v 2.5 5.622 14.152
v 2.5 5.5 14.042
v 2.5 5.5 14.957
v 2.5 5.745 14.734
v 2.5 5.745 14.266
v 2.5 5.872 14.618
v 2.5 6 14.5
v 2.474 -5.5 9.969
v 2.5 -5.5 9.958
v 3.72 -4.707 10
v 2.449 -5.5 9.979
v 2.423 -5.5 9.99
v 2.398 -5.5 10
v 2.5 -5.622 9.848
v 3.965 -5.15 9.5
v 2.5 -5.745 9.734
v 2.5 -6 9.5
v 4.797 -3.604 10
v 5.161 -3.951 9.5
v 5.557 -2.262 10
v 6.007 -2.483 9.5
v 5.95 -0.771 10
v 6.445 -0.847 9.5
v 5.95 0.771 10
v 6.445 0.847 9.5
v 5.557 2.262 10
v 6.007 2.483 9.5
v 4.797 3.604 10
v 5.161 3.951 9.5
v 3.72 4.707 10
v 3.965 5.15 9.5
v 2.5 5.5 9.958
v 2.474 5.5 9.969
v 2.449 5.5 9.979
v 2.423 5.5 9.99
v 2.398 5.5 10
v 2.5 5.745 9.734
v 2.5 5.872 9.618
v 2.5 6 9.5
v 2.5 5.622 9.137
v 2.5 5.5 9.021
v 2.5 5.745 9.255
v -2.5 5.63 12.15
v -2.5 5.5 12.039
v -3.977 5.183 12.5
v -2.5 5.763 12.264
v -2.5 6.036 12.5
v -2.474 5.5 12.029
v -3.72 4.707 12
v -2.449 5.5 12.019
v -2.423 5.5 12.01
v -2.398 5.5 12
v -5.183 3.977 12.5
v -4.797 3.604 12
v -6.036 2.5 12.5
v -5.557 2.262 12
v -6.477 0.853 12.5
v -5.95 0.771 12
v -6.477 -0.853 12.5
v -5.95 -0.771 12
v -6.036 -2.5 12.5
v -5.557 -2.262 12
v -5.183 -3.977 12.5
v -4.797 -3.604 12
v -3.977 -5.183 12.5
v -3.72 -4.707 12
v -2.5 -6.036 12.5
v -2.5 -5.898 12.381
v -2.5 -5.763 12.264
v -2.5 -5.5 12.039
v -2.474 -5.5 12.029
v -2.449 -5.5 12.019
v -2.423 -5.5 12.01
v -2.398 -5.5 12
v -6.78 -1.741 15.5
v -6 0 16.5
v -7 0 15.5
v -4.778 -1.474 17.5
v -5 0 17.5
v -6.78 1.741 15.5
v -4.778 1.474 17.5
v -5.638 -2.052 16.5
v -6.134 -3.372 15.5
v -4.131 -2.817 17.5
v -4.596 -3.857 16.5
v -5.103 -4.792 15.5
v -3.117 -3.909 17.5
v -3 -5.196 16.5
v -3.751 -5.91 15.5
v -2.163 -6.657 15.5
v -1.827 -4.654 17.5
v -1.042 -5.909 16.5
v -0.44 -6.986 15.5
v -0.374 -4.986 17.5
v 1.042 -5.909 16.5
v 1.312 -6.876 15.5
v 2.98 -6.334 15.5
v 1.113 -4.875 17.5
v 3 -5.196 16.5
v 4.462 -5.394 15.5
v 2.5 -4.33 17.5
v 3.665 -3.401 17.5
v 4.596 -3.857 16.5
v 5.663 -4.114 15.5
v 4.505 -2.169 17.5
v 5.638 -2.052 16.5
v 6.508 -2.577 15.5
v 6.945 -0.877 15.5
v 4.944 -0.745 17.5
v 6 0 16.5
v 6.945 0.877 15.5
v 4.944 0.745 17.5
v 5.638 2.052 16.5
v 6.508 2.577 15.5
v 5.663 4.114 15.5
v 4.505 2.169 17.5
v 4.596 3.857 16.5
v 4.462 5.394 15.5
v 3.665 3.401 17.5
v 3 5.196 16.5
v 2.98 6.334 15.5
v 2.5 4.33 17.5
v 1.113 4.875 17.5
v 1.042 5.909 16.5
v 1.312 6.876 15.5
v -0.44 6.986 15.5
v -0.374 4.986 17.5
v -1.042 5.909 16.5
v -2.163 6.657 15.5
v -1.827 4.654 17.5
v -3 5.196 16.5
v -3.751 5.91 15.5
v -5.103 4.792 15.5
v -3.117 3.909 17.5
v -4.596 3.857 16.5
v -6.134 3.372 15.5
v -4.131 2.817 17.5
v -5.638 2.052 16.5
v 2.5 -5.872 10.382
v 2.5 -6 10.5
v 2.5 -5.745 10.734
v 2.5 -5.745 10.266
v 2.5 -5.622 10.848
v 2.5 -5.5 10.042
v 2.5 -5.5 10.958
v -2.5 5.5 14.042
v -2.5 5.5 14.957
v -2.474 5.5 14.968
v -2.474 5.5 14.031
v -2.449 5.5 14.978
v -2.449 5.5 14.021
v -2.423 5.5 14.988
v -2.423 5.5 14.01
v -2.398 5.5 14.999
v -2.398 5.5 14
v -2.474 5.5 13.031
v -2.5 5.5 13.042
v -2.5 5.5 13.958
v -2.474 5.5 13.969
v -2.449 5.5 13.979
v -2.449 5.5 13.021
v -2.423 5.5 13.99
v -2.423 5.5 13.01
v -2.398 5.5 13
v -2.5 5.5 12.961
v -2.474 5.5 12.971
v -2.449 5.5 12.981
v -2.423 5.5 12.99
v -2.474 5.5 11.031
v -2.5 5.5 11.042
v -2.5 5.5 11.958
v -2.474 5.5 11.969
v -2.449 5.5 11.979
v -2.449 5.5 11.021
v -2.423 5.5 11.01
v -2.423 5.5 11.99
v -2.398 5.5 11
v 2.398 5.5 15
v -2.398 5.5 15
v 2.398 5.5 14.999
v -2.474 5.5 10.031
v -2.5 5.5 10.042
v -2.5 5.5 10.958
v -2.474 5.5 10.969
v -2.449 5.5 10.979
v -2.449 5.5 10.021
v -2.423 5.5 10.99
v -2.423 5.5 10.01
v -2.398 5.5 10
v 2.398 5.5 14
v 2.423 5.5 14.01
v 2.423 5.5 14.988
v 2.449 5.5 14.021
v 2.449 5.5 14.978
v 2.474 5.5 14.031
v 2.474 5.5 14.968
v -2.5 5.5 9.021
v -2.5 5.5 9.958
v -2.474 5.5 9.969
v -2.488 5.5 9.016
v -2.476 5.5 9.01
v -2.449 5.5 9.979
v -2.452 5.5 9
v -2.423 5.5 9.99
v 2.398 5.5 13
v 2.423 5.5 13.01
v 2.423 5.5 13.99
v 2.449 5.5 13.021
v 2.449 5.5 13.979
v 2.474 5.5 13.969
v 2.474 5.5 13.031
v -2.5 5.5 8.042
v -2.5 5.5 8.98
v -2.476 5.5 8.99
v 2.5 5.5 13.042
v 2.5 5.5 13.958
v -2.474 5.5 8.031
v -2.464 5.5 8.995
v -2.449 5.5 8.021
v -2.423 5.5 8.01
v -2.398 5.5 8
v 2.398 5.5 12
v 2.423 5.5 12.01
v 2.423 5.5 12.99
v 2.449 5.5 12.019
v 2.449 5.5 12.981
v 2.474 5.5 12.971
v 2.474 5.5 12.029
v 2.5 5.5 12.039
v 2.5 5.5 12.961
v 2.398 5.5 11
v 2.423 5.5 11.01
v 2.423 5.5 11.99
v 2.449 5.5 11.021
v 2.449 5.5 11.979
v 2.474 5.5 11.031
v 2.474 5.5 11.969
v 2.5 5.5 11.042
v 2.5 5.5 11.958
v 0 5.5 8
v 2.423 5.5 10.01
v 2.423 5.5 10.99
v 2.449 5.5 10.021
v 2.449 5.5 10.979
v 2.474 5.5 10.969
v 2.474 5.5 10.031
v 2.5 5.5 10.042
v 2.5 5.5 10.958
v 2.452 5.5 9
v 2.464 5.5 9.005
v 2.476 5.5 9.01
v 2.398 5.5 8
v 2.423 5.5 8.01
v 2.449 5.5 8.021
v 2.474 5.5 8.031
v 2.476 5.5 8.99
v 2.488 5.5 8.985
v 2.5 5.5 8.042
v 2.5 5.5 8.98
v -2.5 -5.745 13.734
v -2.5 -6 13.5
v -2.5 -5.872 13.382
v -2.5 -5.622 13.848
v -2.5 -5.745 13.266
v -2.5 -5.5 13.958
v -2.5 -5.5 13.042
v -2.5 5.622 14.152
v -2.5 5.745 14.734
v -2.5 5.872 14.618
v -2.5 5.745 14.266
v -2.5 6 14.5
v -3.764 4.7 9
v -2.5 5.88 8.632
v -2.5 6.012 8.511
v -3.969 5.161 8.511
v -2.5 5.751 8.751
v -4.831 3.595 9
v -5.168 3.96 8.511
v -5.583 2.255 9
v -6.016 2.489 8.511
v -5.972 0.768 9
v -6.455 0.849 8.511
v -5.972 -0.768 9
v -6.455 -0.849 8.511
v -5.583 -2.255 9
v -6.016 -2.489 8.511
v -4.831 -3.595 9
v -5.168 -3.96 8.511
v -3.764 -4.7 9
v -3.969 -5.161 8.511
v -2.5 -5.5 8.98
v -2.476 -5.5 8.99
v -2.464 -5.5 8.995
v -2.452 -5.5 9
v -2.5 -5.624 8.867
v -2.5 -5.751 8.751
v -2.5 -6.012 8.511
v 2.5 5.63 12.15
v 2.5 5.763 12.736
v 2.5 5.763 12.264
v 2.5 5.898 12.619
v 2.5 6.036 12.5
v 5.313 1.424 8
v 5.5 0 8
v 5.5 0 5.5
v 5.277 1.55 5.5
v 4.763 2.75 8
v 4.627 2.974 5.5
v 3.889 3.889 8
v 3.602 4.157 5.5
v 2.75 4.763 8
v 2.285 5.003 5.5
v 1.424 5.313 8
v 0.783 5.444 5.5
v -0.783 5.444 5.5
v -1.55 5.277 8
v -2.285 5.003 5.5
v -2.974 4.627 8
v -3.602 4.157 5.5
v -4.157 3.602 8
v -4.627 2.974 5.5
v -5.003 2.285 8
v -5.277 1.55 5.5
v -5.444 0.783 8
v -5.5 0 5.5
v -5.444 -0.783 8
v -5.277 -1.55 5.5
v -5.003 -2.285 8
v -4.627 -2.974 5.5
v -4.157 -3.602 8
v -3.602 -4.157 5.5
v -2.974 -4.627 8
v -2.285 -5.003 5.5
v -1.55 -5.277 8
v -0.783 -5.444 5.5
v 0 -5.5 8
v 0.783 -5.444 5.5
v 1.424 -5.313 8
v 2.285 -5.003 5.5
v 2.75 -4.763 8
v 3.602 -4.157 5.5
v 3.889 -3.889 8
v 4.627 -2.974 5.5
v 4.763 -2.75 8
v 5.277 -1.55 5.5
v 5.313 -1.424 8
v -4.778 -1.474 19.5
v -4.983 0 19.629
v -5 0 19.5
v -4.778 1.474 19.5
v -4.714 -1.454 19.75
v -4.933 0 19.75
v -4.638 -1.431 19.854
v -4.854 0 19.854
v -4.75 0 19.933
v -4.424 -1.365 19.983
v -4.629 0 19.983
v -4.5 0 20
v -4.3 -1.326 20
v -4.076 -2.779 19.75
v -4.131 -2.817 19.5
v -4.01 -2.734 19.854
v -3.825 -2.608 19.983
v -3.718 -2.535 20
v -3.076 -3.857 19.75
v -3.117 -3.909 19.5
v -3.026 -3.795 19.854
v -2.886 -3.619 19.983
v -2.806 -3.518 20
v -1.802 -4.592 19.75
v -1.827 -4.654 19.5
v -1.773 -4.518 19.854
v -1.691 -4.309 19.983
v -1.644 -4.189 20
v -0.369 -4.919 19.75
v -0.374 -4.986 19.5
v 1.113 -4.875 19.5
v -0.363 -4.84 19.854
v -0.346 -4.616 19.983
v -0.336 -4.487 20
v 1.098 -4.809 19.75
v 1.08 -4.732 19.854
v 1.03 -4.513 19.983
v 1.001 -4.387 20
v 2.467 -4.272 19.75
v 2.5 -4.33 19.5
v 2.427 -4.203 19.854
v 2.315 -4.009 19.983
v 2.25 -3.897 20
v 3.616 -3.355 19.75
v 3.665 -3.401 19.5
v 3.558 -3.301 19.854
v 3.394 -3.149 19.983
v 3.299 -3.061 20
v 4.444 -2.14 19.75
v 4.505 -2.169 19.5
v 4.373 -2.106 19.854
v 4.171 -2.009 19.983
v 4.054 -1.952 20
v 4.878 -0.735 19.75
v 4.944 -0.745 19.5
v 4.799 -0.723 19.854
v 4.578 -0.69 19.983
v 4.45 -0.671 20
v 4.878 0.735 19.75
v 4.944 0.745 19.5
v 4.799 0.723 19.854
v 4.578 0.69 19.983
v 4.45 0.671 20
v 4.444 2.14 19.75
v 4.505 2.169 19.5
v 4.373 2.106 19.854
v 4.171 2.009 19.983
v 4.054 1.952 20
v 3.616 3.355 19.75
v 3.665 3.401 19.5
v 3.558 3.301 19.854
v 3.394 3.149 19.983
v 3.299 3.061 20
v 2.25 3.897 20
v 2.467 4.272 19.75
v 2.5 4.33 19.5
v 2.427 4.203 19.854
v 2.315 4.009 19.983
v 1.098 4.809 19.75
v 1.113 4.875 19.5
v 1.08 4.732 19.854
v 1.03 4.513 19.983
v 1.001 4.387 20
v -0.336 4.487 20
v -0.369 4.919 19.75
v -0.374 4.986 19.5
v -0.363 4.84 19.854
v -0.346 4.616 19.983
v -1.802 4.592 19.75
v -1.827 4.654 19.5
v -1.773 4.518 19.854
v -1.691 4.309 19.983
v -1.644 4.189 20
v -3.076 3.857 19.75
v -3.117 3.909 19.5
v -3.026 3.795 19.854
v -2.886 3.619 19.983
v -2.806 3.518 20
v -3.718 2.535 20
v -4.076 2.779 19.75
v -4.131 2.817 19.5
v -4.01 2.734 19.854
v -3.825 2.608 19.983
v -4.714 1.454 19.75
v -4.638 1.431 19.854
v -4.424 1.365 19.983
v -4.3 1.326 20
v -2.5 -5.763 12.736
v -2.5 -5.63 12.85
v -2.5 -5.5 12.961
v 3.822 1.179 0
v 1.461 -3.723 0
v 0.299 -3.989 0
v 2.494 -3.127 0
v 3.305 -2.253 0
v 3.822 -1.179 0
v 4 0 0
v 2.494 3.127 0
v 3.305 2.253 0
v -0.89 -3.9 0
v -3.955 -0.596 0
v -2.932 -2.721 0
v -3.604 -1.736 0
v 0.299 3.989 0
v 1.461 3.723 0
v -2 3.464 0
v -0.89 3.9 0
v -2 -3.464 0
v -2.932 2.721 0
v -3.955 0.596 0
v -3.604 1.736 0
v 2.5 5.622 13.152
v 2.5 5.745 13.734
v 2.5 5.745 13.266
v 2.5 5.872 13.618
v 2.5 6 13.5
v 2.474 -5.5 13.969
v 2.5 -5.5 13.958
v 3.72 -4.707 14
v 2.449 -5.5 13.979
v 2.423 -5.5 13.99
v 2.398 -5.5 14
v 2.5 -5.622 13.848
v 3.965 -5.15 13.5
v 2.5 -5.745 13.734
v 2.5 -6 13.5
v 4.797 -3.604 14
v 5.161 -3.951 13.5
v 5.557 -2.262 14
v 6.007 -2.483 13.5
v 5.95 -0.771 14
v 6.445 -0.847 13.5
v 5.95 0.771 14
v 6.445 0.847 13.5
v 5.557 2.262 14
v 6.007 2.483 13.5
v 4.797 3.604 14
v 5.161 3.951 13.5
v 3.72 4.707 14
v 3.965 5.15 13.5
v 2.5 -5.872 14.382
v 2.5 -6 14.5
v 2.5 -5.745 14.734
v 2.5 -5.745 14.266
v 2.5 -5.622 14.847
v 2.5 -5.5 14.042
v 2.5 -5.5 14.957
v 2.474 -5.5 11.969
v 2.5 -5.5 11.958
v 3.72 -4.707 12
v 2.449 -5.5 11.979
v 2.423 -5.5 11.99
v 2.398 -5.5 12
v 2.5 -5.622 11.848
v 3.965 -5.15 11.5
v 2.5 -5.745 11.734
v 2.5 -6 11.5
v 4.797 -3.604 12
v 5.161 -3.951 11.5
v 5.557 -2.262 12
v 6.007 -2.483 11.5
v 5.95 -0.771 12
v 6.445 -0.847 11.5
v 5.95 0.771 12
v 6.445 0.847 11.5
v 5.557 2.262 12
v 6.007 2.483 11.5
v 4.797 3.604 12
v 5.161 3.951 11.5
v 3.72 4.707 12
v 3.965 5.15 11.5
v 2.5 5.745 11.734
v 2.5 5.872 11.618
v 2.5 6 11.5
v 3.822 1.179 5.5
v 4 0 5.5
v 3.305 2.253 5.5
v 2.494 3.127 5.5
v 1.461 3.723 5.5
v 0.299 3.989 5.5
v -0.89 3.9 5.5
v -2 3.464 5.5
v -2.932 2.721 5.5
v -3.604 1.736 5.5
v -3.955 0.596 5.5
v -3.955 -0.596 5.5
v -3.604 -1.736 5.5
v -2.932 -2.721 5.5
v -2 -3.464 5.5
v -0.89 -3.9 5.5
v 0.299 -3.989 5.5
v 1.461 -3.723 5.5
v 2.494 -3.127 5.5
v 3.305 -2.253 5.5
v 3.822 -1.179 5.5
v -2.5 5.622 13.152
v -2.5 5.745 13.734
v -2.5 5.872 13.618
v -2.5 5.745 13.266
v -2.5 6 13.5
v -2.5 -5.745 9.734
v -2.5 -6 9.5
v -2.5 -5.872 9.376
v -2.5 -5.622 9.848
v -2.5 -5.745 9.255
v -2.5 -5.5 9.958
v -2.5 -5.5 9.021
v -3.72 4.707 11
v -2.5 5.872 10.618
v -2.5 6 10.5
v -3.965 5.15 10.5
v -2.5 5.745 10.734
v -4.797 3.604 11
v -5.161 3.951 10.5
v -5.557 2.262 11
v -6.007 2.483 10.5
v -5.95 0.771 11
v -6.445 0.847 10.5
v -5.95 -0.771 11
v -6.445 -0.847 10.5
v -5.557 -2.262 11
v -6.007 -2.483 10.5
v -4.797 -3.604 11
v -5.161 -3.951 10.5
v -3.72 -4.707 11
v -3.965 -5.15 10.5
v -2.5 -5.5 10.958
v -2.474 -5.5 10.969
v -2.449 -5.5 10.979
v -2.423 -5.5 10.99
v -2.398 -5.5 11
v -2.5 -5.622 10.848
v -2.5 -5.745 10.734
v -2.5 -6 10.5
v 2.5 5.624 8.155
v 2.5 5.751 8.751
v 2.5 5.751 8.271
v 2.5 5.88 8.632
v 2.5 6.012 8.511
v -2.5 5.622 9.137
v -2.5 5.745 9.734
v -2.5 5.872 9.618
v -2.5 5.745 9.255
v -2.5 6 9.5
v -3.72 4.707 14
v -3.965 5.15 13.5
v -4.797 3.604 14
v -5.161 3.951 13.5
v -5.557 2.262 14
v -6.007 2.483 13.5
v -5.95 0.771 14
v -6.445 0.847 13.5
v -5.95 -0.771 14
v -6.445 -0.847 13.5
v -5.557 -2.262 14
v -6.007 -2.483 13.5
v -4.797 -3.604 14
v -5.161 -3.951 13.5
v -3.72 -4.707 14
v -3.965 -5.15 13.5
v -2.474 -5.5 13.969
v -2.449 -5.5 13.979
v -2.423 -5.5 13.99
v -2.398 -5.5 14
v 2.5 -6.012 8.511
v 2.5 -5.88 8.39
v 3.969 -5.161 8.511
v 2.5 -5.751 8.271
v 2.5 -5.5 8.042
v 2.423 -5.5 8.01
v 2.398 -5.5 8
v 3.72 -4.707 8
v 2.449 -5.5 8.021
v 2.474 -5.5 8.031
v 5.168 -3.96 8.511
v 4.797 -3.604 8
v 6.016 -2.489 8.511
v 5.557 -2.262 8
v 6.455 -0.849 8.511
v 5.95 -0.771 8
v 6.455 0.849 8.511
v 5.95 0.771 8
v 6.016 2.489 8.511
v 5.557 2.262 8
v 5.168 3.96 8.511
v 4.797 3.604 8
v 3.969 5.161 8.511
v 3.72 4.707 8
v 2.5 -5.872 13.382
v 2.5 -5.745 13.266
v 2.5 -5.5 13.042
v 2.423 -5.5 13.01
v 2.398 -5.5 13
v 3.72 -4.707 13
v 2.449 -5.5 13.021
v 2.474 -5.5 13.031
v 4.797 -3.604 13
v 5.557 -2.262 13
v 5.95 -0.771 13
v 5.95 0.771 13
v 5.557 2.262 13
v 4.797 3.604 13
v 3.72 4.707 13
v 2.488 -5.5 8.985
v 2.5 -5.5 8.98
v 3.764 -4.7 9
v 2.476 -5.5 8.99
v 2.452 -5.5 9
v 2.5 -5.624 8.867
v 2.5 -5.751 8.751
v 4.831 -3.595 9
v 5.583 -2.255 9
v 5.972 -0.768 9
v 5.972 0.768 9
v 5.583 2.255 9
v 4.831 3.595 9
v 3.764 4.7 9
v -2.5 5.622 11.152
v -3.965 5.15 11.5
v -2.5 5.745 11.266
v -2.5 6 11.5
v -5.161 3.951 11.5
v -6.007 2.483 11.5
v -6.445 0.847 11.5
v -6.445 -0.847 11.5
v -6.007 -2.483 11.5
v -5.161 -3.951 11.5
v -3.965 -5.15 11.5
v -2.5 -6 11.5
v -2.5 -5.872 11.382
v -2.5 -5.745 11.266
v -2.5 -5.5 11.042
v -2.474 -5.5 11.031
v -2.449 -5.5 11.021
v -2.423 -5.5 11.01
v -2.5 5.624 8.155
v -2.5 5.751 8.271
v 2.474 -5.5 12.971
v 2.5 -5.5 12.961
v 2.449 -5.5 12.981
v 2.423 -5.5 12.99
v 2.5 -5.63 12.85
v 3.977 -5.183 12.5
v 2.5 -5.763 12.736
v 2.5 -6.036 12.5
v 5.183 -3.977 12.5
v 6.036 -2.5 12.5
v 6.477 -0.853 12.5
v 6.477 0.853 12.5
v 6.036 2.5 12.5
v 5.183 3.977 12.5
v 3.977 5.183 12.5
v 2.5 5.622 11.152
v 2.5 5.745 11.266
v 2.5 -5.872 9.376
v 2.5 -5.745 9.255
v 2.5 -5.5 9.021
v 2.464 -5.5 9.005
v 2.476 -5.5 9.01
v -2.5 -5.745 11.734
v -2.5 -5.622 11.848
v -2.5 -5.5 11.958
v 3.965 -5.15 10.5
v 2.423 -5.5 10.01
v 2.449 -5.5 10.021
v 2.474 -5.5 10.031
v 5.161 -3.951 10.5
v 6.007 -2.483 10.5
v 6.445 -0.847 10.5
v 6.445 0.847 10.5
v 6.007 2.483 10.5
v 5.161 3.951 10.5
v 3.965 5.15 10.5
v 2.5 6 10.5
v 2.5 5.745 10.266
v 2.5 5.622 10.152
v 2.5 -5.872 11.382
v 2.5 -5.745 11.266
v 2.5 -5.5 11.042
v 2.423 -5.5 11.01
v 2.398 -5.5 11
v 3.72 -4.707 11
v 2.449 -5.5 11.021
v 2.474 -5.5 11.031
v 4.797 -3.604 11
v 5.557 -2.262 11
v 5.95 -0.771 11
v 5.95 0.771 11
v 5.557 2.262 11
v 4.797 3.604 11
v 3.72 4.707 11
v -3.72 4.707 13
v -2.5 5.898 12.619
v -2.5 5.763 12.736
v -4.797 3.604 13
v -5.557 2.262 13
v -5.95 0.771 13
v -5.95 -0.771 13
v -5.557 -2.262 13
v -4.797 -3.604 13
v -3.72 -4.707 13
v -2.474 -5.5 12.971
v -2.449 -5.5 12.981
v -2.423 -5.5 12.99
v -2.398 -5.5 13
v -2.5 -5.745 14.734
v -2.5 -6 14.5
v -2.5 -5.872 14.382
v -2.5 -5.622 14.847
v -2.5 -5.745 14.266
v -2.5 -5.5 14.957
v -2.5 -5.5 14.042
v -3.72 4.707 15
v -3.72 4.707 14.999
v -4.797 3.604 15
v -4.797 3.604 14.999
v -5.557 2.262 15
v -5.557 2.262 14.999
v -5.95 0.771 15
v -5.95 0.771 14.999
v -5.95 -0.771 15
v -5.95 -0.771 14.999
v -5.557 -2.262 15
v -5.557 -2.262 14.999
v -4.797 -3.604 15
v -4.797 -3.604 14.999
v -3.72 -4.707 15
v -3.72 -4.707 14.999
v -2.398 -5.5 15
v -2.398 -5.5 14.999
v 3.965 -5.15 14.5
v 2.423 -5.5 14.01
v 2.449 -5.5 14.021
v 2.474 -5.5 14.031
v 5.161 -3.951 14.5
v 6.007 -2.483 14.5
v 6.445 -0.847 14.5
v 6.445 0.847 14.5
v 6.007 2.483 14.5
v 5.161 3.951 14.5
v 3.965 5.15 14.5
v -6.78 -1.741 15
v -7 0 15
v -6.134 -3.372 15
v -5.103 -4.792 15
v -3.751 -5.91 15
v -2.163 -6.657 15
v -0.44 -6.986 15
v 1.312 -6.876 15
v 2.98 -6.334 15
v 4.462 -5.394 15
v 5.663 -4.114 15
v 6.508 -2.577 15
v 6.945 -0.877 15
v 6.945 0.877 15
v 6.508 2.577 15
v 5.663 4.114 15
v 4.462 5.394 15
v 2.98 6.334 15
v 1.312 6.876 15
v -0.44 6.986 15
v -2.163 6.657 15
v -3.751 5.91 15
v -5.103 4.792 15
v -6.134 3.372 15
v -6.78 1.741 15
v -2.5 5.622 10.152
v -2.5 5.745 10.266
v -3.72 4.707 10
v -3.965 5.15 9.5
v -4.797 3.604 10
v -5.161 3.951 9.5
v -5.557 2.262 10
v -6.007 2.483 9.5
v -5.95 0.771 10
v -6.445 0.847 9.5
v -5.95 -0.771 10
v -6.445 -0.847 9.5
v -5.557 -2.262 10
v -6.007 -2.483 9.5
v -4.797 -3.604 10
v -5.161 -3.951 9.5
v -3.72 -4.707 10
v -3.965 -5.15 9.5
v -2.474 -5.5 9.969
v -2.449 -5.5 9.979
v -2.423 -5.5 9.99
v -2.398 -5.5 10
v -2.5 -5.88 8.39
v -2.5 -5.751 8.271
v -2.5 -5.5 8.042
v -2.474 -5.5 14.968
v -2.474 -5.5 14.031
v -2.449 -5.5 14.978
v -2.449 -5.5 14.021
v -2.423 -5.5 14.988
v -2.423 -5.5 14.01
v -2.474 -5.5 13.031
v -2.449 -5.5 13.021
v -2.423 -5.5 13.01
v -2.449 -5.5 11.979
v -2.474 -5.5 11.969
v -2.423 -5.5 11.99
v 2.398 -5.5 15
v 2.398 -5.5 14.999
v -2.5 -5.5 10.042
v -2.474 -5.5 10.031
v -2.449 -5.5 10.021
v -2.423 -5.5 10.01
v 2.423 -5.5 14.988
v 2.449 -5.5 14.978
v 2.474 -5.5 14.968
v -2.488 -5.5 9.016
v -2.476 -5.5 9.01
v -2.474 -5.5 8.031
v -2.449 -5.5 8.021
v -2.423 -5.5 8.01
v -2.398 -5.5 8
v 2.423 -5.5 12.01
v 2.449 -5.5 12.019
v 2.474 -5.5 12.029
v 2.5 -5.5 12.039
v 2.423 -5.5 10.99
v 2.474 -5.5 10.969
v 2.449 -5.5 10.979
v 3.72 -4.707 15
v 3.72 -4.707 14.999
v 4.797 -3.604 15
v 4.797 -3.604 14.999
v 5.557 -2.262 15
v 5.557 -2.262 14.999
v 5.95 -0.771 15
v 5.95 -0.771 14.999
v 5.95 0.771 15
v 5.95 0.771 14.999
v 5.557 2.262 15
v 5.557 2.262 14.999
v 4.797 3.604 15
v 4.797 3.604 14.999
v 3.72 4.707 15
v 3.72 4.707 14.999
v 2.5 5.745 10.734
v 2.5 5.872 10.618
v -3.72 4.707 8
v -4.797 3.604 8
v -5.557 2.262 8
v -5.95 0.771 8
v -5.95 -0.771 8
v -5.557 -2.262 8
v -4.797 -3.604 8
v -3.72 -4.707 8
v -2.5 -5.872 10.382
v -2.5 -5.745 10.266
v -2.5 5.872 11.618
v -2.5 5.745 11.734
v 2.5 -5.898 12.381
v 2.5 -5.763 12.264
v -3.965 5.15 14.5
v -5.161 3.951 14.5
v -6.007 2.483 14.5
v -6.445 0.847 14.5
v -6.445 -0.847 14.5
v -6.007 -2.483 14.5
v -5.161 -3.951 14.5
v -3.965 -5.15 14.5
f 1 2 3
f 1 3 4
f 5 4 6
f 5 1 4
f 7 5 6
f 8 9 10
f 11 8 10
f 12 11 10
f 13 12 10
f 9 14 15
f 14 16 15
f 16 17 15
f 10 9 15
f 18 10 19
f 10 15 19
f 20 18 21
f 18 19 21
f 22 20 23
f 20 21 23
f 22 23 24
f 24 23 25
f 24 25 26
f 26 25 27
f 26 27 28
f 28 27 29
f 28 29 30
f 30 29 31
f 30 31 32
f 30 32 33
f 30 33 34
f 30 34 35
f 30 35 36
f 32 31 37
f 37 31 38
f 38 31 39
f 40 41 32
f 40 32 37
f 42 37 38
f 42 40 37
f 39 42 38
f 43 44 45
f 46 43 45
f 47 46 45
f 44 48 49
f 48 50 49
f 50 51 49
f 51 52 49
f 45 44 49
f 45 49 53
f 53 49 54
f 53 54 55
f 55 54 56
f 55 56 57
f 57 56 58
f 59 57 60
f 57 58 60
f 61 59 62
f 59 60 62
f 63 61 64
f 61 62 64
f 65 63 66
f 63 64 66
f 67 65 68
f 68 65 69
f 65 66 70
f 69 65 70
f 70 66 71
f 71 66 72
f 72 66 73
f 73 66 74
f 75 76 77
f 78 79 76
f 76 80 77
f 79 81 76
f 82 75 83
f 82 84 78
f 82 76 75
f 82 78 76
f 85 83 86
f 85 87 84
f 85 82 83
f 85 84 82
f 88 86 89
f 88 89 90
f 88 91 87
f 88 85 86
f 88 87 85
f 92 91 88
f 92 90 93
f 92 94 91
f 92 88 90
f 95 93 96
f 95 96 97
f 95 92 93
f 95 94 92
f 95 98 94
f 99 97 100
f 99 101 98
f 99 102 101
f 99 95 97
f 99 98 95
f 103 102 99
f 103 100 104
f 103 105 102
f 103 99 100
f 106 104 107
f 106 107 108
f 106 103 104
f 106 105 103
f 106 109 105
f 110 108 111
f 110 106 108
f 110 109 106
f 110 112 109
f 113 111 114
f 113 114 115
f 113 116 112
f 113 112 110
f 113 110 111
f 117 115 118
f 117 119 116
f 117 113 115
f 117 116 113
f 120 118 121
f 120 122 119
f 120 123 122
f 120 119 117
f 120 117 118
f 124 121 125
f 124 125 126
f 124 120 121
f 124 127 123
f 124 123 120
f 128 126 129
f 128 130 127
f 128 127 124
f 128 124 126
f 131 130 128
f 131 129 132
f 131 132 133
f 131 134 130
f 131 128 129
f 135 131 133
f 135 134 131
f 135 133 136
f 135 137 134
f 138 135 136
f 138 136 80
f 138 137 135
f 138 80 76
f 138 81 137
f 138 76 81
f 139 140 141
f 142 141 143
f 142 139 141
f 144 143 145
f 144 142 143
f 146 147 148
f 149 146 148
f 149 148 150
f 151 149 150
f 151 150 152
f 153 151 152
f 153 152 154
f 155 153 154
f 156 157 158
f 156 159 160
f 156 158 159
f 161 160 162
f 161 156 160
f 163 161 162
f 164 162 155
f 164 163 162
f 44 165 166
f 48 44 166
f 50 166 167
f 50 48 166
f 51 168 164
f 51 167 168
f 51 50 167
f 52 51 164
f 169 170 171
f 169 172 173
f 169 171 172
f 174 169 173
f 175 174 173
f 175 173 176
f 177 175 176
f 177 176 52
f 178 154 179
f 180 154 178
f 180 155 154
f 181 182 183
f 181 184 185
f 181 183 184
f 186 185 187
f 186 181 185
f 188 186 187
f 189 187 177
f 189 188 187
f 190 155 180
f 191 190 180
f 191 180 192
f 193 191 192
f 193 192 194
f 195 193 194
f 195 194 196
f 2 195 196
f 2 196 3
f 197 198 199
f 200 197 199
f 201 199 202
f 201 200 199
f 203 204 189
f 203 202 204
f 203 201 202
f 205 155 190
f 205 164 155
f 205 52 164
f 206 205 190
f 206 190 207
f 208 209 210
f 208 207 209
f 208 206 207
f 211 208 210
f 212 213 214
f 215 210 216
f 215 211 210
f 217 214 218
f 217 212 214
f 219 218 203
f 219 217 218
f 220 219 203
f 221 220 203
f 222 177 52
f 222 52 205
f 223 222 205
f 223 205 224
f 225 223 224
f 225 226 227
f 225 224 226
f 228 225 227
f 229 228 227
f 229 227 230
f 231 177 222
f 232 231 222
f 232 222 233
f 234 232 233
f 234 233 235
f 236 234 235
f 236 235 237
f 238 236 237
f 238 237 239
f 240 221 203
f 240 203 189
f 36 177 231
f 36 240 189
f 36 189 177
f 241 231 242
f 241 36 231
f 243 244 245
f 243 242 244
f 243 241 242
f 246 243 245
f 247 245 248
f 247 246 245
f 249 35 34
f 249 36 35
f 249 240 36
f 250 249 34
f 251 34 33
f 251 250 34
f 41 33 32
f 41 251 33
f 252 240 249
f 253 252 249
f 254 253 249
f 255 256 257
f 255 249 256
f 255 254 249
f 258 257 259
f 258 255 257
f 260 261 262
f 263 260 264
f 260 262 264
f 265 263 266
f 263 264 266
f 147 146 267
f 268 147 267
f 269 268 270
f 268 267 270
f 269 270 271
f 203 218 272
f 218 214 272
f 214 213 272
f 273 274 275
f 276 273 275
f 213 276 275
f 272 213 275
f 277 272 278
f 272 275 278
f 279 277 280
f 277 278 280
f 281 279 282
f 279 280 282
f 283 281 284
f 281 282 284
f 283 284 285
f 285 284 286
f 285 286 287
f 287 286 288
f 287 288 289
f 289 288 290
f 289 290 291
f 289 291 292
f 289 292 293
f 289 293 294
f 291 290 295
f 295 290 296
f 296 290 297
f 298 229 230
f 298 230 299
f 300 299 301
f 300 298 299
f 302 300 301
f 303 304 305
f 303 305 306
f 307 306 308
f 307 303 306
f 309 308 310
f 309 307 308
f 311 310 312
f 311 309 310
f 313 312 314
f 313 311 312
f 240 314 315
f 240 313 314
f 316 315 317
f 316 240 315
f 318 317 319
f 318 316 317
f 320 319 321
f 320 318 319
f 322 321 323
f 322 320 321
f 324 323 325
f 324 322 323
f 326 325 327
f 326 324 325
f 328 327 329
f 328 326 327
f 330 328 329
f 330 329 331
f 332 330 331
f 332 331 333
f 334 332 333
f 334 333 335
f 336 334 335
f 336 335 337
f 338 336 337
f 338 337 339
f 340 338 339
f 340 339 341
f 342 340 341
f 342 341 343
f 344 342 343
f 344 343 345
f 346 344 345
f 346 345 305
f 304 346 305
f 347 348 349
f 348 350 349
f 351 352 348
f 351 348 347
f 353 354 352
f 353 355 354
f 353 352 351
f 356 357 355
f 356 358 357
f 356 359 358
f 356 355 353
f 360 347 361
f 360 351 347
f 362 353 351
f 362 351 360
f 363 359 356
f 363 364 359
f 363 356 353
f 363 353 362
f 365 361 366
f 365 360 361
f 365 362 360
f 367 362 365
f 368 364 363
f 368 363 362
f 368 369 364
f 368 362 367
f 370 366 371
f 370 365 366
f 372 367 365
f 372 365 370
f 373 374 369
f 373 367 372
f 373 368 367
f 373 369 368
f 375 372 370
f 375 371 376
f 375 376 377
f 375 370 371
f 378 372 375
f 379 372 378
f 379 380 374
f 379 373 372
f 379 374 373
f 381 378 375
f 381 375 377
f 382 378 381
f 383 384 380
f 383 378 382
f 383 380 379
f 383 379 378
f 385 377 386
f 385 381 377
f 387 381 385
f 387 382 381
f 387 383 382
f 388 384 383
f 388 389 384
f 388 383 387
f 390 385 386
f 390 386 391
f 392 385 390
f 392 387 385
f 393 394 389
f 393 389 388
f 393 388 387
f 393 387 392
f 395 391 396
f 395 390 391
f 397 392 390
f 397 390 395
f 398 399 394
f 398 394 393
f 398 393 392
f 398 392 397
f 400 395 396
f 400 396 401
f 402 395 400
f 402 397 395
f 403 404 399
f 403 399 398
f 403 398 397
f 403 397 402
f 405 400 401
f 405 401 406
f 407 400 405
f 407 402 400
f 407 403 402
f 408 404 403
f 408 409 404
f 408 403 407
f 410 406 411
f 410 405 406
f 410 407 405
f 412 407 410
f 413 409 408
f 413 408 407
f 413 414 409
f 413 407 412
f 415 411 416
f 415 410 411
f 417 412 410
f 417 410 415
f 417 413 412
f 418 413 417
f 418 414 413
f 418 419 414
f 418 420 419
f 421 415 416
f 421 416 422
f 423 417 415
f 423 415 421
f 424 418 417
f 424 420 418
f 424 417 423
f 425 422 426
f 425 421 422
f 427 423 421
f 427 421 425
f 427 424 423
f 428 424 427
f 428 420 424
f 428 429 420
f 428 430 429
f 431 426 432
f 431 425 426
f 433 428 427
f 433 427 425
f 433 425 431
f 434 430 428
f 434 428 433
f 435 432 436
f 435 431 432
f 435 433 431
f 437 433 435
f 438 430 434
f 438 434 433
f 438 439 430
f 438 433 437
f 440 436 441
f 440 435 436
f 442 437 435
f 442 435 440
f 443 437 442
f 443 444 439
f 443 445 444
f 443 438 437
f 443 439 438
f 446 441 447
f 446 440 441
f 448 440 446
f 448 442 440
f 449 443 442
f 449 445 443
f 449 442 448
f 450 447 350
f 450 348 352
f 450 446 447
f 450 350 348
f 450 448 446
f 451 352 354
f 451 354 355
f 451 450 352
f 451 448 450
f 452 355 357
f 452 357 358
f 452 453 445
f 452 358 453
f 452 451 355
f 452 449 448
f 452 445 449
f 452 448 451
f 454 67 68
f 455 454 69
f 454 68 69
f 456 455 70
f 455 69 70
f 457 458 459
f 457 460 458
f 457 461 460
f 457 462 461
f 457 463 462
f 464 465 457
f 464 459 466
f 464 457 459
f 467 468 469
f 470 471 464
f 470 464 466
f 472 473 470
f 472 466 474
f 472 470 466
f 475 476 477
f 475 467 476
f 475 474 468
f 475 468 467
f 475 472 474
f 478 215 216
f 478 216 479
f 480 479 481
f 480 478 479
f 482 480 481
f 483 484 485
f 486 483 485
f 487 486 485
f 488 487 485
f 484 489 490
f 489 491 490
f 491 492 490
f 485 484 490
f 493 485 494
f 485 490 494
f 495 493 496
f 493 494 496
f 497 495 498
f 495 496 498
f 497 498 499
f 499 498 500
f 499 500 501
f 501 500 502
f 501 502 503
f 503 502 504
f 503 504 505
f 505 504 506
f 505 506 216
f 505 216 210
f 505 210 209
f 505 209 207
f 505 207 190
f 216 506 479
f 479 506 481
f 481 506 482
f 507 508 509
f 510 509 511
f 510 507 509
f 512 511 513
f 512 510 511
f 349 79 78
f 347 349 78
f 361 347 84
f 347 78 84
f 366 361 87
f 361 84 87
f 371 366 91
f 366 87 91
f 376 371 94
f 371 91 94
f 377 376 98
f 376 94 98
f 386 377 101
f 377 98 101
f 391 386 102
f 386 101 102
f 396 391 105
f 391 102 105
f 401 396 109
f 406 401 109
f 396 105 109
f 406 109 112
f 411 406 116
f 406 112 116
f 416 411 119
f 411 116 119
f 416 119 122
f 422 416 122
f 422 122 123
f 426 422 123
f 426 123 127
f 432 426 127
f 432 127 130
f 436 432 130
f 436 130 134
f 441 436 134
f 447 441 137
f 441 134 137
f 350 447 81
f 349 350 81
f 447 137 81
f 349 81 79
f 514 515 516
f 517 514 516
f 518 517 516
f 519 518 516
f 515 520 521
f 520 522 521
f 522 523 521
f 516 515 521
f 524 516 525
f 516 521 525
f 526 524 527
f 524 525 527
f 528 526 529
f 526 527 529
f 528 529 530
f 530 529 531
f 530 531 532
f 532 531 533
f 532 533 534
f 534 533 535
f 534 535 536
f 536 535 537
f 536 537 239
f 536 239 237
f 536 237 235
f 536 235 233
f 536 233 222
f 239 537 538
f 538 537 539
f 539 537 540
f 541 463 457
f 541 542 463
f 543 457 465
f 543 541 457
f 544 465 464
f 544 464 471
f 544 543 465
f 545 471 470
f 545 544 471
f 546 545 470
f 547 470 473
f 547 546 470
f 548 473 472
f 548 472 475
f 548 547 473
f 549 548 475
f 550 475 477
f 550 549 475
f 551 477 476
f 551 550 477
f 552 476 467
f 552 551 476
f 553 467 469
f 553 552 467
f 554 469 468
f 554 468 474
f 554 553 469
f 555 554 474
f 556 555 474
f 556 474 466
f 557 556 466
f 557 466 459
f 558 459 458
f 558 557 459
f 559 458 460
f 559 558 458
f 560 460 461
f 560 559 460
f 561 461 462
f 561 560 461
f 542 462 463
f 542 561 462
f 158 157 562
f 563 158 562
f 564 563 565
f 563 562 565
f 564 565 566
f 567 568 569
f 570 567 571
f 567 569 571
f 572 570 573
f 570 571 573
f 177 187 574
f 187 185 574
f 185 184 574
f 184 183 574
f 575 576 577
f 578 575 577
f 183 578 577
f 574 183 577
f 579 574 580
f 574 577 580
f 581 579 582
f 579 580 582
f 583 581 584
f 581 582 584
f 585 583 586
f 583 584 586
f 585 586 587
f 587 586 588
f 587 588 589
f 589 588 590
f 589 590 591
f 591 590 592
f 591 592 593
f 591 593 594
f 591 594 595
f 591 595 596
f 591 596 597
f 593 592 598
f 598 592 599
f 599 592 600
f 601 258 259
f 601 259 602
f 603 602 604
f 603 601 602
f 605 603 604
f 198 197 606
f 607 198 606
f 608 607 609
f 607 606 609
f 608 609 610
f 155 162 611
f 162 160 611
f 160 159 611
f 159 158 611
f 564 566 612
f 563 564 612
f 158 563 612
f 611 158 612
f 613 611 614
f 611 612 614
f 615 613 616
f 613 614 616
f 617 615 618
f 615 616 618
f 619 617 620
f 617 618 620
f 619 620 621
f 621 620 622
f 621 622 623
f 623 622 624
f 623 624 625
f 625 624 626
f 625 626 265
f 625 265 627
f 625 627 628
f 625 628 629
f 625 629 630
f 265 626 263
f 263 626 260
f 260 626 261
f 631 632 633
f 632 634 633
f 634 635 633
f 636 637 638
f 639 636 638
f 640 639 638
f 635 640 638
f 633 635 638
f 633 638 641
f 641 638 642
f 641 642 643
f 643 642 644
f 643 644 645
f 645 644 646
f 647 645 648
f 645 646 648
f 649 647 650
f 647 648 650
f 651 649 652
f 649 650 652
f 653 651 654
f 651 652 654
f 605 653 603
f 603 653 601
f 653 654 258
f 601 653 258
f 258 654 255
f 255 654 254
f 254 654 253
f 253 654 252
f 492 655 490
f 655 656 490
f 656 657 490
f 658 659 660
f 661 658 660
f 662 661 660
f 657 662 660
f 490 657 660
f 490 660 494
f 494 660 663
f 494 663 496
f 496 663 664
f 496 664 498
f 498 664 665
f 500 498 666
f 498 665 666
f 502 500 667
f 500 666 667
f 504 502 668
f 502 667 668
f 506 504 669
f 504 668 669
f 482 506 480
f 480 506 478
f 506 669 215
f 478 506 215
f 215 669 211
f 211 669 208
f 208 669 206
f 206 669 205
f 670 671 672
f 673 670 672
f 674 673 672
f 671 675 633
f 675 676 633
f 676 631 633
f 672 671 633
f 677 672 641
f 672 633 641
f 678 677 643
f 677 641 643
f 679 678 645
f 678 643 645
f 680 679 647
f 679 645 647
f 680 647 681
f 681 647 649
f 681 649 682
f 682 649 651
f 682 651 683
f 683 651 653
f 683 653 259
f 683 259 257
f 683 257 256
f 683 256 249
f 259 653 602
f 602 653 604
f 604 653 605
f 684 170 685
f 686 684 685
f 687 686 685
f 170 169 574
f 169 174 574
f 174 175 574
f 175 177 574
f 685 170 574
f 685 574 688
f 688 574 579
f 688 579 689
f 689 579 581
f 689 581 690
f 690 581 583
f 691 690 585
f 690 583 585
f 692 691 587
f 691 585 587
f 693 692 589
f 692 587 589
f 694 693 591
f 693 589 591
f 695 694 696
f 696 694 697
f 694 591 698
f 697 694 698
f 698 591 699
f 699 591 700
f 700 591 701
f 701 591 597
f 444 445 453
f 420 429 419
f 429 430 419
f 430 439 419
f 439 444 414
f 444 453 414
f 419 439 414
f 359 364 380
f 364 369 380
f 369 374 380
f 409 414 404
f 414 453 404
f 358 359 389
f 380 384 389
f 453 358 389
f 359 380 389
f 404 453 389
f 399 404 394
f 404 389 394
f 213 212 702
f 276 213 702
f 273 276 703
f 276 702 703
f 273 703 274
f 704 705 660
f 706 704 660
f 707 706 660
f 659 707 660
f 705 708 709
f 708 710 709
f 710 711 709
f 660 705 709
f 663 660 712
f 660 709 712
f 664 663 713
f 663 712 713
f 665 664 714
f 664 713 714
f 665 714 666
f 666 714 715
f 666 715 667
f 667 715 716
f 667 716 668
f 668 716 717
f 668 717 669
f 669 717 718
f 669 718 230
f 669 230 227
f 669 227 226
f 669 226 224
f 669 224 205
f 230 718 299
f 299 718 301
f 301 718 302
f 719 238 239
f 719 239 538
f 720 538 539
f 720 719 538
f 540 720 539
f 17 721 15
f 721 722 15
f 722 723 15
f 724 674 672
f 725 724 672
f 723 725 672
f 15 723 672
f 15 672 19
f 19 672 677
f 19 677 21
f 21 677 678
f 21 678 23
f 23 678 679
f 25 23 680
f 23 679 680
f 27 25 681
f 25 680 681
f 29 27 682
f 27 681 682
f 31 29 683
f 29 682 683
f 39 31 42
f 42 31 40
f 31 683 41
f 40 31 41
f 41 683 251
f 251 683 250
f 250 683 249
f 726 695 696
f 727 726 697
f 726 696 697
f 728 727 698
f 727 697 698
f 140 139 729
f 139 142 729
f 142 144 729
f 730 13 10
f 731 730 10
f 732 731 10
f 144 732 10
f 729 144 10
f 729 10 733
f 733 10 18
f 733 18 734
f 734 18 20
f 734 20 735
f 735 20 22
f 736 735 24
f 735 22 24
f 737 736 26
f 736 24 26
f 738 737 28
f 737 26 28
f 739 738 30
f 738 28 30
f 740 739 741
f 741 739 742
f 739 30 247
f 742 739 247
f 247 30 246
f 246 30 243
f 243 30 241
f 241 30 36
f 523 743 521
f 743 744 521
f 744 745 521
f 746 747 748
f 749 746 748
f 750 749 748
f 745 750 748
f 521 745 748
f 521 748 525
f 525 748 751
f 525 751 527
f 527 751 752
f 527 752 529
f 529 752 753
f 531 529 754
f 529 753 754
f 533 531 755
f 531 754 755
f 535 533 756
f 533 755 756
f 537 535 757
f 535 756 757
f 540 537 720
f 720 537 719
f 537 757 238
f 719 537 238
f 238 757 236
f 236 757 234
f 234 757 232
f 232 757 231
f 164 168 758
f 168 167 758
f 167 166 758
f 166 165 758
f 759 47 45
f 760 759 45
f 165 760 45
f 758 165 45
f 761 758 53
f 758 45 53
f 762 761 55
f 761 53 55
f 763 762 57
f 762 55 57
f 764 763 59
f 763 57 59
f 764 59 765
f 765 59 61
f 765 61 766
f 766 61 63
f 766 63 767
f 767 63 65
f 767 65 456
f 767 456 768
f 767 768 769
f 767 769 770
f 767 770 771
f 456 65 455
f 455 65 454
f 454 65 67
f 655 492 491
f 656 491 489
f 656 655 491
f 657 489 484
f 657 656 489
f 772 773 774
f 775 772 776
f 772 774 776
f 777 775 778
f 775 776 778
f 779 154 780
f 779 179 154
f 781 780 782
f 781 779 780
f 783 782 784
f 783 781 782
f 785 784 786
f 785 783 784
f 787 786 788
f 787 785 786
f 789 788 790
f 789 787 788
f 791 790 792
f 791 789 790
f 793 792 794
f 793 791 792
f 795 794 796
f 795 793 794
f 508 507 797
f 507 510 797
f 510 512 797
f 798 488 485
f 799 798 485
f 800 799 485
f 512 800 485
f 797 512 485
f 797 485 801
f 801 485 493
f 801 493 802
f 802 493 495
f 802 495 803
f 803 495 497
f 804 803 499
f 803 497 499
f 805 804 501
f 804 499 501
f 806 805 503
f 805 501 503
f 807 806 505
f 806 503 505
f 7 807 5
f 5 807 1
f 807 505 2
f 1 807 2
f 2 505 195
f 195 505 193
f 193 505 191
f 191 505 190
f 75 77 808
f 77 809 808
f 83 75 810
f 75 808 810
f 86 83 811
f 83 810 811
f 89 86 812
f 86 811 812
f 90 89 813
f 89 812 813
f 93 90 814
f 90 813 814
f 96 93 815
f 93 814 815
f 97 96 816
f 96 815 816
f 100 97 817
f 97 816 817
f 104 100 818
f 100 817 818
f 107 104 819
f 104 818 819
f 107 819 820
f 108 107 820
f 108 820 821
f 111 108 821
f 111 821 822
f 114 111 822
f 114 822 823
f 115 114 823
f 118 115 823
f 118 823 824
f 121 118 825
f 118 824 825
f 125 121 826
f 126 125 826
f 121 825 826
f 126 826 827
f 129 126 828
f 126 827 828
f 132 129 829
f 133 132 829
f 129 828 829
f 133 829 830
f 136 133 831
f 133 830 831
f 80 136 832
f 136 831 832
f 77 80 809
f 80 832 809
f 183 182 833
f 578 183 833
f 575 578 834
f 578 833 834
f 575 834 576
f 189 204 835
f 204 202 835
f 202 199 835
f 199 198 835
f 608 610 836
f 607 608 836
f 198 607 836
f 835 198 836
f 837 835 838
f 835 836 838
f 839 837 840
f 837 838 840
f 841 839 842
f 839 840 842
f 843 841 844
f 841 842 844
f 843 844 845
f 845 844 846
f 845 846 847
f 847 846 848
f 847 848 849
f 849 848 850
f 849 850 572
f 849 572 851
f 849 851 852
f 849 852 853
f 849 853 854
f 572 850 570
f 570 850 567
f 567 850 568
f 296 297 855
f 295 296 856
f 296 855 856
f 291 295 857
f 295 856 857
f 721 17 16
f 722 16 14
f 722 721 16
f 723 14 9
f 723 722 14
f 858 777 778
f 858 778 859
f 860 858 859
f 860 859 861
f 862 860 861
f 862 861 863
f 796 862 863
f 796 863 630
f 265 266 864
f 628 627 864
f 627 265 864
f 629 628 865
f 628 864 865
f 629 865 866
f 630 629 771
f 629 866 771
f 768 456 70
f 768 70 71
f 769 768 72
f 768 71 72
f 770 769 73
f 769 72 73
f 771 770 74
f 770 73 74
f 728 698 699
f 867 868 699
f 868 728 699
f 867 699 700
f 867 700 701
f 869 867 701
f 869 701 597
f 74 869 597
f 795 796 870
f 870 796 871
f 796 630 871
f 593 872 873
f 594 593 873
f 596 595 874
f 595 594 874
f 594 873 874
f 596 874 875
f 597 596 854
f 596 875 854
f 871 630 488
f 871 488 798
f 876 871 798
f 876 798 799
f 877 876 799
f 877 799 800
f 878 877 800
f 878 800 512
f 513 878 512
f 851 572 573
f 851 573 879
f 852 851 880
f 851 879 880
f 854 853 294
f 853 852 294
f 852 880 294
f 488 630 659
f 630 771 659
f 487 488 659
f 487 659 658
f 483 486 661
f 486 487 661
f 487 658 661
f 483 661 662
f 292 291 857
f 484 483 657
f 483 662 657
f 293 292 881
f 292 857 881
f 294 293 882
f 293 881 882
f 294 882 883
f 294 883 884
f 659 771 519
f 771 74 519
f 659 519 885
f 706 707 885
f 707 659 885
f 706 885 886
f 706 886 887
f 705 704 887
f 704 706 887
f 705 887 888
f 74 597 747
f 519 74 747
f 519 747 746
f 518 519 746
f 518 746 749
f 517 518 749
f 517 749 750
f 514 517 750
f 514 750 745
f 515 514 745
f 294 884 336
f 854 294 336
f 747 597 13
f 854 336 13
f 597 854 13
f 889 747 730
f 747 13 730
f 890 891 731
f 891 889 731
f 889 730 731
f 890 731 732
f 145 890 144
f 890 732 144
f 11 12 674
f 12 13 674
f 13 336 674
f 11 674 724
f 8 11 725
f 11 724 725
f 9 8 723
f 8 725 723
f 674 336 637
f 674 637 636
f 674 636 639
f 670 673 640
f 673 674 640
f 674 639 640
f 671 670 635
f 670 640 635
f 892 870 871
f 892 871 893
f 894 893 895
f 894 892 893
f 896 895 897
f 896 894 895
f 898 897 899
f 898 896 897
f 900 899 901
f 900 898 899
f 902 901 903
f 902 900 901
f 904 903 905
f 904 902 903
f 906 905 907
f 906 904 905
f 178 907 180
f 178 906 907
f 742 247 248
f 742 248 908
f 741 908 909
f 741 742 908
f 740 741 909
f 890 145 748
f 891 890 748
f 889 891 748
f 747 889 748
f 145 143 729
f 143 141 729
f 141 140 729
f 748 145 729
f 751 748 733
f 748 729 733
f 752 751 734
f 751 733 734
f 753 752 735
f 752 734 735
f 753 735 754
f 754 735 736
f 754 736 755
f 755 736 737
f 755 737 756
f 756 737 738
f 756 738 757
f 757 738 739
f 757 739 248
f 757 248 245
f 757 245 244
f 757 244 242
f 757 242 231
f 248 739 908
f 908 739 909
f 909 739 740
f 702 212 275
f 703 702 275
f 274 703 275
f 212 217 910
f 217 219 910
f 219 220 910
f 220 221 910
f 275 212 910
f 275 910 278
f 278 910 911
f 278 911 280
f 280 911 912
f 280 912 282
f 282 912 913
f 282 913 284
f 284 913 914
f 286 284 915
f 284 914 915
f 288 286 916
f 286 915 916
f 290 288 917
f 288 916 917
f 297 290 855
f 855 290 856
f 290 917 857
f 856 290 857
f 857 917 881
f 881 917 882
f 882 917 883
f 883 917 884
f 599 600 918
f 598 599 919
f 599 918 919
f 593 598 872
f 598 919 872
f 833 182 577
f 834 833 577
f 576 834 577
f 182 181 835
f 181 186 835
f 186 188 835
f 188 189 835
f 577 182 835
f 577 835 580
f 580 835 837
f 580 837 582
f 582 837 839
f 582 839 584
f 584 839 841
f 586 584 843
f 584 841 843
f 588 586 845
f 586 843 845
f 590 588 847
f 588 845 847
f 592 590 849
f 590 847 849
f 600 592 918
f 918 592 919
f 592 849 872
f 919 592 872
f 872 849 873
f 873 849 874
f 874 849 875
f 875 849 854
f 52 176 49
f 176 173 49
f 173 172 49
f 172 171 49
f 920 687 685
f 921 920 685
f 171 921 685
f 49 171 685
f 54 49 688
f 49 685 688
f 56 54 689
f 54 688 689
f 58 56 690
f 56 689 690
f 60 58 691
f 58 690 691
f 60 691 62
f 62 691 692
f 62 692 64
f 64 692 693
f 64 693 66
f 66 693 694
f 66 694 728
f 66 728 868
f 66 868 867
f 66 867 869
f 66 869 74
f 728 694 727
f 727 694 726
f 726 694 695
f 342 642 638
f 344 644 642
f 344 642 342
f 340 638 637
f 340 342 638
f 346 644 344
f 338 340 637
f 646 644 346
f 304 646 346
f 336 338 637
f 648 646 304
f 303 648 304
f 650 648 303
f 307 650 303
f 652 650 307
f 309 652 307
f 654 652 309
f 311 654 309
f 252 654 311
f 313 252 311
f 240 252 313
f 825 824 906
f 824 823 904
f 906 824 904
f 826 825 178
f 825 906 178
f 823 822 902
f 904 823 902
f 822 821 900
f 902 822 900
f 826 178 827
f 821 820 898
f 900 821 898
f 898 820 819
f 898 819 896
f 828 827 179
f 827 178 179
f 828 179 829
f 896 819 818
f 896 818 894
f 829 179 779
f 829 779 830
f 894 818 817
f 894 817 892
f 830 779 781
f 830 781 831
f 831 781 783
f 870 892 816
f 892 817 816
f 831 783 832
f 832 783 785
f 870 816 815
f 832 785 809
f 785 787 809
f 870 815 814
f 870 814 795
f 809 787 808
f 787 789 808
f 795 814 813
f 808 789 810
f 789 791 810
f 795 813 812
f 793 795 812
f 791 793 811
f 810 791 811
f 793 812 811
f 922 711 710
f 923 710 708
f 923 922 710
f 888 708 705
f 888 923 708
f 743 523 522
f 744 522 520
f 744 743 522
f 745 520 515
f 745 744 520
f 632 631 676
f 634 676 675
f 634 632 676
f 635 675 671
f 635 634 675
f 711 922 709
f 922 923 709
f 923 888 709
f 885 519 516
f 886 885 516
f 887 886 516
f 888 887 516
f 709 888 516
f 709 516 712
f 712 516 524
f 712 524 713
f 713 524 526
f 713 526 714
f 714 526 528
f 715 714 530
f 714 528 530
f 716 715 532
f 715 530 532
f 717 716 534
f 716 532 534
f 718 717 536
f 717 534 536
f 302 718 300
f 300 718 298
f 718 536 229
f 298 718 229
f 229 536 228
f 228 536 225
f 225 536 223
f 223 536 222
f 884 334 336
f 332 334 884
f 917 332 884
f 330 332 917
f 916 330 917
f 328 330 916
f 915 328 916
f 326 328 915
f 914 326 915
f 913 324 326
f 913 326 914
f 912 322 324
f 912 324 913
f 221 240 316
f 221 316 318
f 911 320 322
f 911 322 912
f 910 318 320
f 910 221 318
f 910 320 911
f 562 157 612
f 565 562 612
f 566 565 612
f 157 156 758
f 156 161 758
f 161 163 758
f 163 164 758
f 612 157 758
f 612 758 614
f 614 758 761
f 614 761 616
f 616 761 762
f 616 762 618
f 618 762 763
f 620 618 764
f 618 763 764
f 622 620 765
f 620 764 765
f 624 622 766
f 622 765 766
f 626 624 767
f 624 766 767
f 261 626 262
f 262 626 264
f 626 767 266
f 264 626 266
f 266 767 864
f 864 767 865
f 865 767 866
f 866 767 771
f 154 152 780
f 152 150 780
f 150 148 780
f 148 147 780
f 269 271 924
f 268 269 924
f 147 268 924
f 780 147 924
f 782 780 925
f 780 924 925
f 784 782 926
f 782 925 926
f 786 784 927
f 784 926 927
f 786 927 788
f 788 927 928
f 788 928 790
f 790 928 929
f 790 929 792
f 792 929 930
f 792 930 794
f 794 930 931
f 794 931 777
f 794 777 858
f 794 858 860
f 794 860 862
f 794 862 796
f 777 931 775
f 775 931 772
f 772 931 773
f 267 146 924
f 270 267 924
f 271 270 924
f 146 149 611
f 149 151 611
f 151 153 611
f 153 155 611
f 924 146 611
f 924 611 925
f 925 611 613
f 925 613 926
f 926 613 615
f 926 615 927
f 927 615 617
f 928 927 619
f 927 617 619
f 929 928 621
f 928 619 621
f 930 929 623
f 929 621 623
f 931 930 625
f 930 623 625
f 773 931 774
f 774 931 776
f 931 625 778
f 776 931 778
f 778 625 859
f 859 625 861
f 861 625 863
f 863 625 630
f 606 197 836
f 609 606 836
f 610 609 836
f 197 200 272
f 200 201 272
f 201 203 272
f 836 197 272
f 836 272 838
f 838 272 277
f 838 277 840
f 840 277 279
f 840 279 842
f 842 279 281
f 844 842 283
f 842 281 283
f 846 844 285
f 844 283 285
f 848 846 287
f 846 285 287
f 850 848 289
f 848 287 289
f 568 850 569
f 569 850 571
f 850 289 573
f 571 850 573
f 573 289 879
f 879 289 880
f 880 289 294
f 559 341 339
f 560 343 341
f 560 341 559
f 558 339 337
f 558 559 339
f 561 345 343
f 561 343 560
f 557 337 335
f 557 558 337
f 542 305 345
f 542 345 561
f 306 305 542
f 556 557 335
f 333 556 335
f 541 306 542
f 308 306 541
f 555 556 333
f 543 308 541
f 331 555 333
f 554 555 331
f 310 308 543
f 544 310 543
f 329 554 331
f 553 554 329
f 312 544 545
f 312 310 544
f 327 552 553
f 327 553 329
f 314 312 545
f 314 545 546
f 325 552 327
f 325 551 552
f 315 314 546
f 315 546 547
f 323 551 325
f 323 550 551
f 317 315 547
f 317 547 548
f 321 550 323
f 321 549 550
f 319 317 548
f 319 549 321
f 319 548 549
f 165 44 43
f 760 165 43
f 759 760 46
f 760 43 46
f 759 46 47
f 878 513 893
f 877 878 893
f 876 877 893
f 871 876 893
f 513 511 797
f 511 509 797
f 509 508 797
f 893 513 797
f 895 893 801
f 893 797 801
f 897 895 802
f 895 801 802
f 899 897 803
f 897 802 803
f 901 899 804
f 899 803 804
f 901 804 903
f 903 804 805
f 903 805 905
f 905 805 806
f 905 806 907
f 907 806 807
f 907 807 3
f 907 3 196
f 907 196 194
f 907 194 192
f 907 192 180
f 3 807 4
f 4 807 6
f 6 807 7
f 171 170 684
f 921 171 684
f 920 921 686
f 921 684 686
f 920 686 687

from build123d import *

# Parameters (mm, degrees)
F2_W      = 6
F2_H      = 7
F10_SIZE2 = 1.99999
F10_SIZE  = 1.99999
F11_R     = 0.5
F12_W     = 5
F12_H     = 3.4022161548
F12_H_2   = 4.2761773802
F13_DEPTH = 15


# Not quite as in the source:
# - a fillet or chamfer is up to 0.001 mm smaller than in the source, because OpenCascade refuses the exact size


with BuildPart() as f1:
    # F0 (on Front) → F1 (revolve)
    with BuildSketch(Plane.XZ):
        Polygon((0, 8), (0, 0), (4, 0), (4, 5.5), (5.5, 5.5), (5.5, 8), align=None)
    revolve(axis=Axis((0, 0, 8.8947357469), (0, 0, 1)))

    # F2 (on Front) → F3 (revolve)
    with BuildSketch(Plane.XZ):
        with Locations((3, 11.5)):
            Rectangle(F2_W, F2_H)
    revolve(axis=Axis((0, 0, 12.8918935508), (0, 0, 1)))

    # F6 (on Front) → F7 (revolve)
    with BuildSketch(Plane.XZ):
        Polygon((-6.5108180568, 8.5108180568), (-6, 8), (0, 8), (0, 15), (-5.9985076077, 15), (-6.5, 14.5), (-6, 14), (-6.5, 13.5), (-6, 13), (-6.532786414, 12.5), (-6, 12), (-6.5, 11.5), (-6, 11), (-6.5, 10.5), (-6, 10), (-6.5, 9.5), (-6.0216361135, 9), align=None)
    revolve(axis=Axis((0, 0, 9.6160949171), (0, 0, 1)))

    # F8 (on Front) → F9 (revolve)
    with BuildSketch(Plane.XZ):
        Polygon((-7, 15), (0, 15), (0, 20), (-5, 20), (-5, 17.5), (-7, 17.5), align=None)
    revolve(axis=Axis((0, 0, 18.9704594016), (0, 0, 1)))

    # F10 (size 2 and 2 in the source; OpenCascade refuses exactly that, so slightly less here)
    f10_edges = [f1.edges().sort_by_distance(p)[0] for p in [
        (7, 0, 17.5),
    ]]
    chamfer(f10_edges, length=F10_SIZE, length2=F10_SIZE2)

    # F11
    f11_edges = [f1.edges().sort_by_distance(p)[0] for p in [
        (5, 0, 20),
    ]]
    fillet(f11_edges, radius=F11_R)

    # F12 (on Top) → F13 (cut, through all)
    with BuildSketch(Plane.XY):
        with Locations((0, 7.2011080774)):
            Rectangle(F12_W, F12_H)
        with Locations((0, -7.6380886901)):
            Rectangle(F12_W, F12_H_2)
    extrude(amount=F13_DEPTH, mode=Mode.SUBTRACT)


solid = f1.part
